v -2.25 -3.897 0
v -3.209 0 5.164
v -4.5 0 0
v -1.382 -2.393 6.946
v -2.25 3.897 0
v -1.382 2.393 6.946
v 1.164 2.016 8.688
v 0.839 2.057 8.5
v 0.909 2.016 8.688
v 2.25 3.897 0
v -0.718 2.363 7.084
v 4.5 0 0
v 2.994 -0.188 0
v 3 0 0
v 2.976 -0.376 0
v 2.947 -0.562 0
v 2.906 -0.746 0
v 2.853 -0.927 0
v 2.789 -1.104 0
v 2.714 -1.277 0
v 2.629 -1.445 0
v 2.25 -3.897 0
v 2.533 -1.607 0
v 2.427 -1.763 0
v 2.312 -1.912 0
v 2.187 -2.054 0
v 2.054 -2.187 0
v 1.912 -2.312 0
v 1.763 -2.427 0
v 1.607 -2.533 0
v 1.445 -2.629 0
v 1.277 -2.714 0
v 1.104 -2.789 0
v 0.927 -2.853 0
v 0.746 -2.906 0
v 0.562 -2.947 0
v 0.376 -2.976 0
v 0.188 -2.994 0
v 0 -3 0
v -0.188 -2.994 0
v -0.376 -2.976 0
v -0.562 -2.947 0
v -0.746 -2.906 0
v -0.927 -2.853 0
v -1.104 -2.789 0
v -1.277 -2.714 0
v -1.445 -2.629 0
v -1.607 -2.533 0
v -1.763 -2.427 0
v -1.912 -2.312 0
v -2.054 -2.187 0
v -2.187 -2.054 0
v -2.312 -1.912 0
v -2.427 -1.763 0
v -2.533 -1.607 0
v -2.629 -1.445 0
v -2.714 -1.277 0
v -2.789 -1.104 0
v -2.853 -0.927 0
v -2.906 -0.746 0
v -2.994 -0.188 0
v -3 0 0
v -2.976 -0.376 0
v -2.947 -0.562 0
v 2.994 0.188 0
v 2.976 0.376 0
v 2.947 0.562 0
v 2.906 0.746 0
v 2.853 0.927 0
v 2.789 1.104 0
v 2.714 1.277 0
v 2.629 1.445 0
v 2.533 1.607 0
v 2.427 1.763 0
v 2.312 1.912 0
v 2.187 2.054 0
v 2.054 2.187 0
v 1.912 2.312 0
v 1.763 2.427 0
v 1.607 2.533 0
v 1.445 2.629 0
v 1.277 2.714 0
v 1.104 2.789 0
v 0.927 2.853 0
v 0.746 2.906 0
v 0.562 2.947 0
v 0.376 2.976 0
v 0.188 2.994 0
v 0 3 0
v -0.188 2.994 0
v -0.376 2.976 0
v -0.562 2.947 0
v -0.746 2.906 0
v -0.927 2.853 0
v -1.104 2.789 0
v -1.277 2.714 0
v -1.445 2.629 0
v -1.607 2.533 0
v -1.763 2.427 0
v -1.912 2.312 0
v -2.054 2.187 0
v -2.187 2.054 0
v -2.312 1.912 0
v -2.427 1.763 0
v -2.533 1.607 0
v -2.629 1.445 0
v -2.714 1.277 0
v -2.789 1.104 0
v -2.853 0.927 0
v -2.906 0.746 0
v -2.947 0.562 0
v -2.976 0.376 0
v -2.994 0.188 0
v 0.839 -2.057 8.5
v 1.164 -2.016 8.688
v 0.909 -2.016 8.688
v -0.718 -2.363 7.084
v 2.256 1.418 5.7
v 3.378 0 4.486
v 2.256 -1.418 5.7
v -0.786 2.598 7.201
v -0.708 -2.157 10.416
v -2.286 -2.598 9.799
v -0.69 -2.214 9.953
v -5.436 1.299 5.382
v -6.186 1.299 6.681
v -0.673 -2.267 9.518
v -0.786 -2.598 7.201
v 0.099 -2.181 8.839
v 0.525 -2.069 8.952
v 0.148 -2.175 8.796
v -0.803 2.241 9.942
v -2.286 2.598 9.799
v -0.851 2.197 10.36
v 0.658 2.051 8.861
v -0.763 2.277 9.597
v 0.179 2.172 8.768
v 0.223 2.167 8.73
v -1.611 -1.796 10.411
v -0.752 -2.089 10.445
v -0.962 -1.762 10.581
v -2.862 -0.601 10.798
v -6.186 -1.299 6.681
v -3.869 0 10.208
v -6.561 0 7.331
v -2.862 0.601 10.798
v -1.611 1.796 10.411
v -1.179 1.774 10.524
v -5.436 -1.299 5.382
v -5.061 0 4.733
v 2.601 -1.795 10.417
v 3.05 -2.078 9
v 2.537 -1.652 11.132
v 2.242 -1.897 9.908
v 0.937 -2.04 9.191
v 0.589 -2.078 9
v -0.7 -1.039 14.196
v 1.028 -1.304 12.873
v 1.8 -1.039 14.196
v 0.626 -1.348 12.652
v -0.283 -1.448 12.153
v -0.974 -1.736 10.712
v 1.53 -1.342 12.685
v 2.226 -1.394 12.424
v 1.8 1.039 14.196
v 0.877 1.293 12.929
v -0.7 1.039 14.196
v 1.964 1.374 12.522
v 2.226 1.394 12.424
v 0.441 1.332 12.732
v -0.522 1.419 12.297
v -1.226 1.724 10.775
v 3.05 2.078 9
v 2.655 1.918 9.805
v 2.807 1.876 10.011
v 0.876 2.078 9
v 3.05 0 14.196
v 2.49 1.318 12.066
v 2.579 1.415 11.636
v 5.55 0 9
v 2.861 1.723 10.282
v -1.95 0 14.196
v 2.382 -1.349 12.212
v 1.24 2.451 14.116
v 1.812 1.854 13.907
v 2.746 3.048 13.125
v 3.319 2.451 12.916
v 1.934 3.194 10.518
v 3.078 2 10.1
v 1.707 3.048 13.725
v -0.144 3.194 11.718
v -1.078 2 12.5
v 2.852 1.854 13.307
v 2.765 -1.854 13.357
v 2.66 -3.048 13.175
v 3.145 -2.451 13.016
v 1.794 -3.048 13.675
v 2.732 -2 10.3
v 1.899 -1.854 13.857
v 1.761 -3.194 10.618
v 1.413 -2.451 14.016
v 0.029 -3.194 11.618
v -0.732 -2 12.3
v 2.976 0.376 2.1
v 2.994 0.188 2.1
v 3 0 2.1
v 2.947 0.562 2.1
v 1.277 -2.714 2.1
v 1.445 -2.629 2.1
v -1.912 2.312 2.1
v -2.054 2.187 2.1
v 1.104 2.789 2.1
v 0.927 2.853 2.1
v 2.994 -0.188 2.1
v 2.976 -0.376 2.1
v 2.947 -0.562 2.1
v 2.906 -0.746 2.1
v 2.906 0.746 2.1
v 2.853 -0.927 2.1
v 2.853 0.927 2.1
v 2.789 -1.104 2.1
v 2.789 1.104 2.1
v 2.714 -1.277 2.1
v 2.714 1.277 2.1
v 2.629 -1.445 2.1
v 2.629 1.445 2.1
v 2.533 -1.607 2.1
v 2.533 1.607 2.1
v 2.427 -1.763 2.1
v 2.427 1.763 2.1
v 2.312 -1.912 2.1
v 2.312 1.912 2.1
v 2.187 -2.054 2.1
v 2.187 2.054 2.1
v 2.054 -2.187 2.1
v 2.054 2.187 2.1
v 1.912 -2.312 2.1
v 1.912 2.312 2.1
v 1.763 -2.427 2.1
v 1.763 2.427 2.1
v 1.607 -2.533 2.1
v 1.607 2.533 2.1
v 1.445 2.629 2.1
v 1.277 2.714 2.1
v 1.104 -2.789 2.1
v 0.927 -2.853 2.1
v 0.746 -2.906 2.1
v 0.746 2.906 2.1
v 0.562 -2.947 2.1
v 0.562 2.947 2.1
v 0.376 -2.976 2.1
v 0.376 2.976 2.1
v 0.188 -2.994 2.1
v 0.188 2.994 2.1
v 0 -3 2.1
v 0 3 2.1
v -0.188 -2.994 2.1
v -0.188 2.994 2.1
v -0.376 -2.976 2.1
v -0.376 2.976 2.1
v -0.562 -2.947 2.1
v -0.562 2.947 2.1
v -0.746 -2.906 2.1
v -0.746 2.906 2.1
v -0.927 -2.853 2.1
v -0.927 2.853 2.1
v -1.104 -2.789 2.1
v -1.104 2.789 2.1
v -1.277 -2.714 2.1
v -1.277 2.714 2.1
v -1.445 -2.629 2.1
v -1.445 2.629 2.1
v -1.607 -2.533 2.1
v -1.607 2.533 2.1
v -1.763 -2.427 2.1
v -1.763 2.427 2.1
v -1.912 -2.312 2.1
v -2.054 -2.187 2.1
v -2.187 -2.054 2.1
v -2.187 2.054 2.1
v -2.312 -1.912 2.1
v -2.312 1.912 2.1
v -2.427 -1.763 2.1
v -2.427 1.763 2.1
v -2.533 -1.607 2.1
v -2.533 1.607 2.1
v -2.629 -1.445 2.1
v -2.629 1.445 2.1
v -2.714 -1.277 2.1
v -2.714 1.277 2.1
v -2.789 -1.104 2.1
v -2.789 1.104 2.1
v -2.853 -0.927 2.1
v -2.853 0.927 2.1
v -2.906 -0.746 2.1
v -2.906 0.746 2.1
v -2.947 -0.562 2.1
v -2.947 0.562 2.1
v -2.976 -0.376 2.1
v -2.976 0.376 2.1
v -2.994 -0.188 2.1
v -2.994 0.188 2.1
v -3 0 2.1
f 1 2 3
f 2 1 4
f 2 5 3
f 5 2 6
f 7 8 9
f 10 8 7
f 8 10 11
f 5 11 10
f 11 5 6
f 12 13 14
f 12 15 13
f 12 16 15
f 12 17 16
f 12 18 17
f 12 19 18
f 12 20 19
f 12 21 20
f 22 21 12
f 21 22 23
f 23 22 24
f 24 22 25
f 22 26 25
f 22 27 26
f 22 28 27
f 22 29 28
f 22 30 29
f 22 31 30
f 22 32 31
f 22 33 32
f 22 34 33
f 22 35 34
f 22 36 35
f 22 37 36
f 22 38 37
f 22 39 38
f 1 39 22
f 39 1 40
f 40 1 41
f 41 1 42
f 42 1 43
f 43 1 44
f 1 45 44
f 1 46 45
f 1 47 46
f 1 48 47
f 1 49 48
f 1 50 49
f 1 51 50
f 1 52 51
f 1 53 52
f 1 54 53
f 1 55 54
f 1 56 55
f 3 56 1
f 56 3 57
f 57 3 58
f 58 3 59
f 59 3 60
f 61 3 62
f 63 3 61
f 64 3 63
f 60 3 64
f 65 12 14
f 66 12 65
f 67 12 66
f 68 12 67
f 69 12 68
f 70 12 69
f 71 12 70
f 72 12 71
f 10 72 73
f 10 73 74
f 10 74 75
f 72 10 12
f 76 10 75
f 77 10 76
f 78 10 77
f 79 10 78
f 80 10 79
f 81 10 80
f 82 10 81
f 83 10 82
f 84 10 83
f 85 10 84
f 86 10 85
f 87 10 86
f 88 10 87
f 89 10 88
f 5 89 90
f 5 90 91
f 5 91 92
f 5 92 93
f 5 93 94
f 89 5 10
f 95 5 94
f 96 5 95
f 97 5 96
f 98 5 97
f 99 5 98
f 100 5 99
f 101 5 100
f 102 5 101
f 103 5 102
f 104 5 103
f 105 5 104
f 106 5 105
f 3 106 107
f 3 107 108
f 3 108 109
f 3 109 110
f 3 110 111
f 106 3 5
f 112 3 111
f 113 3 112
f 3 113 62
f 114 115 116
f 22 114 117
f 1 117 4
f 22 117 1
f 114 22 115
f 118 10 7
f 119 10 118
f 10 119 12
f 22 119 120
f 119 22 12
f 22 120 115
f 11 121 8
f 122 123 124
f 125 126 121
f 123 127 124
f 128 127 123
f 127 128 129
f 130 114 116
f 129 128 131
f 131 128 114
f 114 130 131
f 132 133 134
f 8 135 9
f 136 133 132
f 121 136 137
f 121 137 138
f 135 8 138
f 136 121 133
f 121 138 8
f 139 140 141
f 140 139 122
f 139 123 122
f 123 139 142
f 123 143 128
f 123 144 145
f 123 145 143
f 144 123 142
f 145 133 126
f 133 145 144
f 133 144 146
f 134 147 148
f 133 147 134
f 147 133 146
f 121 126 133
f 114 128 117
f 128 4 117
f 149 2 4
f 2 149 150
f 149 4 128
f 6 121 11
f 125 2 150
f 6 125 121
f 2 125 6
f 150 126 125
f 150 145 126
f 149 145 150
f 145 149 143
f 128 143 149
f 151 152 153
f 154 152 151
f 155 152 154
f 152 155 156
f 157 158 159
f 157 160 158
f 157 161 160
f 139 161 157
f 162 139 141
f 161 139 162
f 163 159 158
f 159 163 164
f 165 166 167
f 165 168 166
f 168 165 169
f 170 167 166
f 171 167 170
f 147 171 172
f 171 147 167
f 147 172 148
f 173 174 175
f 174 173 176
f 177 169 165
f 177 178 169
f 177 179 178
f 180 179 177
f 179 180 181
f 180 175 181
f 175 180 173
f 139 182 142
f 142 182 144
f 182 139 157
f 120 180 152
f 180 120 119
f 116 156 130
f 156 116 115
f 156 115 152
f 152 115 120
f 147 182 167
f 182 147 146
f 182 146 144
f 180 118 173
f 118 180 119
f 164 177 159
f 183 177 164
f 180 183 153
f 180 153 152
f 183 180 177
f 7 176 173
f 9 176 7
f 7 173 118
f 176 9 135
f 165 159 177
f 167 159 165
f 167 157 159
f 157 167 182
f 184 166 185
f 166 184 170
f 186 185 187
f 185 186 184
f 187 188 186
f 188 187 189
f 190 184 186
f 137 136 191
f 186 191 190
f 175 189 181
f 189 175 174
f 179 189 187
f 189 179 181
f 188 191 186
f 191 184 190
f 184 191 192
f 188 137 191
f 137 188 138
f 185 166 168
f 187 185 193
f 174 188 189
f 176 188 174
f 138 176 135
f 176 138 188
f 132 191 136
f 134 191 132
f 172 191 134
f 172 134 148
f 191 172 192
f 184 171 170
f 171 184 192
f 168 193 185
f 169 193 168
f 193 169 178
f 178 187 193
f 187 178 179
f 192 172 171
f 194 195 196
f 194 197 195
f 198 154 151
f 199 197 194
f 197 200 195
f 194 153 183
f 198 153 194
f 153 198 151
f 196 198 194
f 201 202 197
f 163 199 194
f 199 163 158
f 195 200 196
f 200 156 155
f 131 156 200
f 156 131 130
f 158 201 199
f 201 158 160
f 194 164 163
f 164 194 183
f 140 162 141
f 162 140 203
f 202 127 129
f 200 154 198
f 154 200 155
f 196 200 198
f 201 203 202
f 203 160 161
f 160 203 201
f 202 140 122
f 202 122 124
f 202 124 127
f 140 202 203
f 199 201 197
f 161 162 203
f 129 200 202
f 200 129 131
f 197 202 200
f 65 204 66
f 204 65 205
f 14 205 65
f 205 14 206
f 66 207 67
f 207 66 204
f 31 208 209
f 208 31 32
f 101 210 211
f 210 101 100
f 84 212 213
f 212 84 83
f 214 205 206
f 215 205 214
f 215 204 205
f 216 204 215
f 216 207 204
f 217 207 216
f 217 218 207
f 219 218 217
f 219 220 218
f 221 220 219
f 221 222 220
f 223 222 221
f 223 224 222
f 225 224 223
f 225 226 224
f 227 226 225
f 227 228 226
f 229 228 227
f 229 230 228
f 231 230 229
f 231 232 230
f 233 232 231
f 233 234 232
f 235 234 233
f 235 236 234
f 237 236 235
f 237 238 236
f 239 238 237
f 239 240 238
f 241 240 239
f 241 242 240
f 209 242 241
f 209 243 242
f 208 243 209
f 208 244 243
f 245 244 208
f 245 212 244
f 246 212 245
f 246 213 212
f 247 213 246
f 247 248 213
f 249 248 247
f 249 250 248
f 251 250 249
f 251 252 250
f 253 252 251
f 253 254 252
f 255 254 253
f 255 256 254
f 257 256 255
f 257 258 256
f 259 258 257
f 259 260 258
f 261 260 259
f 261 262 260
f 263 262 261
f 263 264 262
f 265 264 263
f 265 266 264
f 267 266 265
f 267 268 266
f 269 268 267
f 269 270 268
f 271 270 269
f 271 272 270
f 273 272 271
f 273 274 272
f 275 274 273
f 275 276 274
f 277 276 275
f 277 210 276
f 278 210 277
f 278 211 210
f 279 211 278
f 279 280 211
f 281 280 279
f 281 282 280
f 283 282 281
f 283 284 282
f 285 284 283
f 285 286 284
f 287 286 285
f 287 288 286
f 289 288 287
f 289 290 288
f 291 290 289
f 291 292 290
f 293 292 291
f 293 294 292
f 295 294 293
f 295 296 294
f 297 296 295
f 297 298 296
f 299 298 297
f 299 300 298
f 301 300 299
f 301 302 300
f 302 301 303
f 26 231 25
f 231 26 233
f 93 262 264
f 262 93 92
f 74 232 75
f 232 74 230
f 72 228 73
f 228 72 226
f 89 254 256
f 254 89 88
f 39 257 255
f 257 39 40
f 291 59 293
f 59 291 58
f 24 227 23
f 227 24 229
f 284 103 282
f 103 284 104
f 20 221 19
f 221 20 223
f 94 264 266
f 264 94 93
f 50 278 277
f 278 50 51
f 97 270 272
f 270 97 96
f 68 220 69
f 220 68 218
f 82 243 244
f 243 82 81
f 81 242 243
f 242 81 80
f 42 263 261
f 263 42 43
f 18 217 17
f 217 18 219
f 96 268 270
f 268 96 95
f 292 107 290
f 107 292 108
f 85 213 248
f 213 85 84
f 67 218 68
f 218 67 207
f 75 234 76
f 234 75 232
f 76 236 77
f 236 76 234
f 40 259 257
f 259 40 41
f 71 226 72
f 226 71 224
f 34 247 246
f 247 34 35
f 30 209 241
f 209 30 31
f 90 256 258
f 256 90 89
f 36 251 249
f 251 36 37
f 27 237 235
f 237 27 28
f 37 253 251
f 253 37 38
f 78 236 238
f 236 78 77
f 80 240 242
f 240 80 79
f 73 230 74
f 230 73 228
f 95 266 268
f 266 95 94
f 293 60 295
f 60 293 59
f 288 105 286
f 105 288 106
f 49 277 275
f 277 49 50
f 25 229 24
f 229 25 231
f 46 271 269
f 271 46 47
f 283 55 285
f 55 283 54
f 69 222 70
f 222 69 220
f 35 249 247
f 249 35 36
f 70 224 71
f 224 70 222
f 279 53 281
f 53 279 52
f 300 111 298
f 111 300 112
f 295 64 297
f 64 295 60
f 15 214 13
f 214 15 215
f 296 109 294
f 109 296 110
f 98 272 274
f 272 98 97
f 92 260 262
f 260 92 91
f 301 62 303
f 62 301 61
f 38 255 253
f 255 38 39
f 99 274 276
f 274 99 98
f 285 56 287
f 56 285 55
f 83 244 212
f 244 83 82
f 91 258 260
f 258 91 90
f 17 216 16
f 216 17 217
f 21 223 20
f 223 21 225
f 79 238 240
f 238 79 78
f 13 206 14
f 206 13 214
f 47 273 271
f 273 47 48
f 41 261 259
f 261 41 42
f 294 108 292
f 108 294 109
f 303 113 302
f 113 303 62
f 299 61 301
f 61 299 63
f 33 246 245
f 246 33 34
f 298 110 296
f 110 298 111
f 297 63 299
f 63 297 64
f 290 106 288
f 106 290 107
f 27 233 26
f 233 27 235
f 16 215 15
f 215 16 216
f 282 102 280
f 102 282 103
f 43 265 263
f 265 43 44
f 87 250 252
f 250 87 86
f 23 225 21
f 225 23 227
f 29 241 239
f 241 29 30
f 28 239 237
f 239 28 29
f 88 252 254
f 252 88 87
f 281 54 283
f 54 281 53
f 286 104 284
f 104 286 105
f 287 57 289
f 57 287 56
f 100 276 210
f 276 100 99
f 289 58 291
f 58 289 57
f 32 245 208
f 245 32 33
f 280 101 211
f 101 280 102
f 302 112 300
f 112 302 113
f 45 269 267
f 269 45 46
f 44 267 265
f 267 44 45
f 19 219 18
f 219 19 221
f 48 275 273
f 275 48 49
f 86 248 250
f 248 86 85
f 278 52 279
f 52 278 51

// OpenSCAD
/*
Horse Piece Generator
*/

// Parameters
$fn = 6; // Number of faces for low-poly preview

magnet_height = 2.1;      // Magnet height
magnet_radius = 3;        // Magnet radius

body_height = 5.5;        // Body height
body_radius = 4.5;        // Body radius

neck_radius = 2;          // Neck radius
head_radius = 1.6;        // Head radius

transparency = 5;         // Transparency level
color_rgb = [143, 255, 61]; // Color as RGB (0–255)

// Bounding box (optional helper for scale visualization)
module bounds() {
    color("red", 0.3)
        cube([6, 1, 17]); // Max width × depth × height
}

// Main model: Horse piece
module horse() {
    union() {
        color(color_rgb / 255, transparency) {

            // Body (tapered cylinder)
            cylinder(h = 12, r1 = body_radius, r2 = body_radius - 3, center = false, $fn = 6);

            // Snout (long nose projection)
            translate([-5, 0, body_height + 1])
                rotate([0, 60, 0])
                    translate([0, 0, 4])
                        scale([1, 1, 1.9])
                            sphere(r = 3);

            // Center of head (bulge)
            translate([0.55, 0, body_height + 3.5])
                scale([2.5, 1.2, 3])
                    sphere(r = neck_radius);

            // Left ear
            translate([1, 2, body_height + 5.8])
                rotate([-10, 30, 0])
                    scale([1.2, 0.7, 1.5])
                        sphere(r = neck_radius);

            // Right ear
            translate([1, -2, body_height + 5.8])
                rotate([10, 30, 0])
                    scale([1, 0.7, 1.5])
                        sphere(r = neck_radius);
        }
    }
}

// Magnet cavity
module magnet_cavity() {
    offset = 0.5;
    translate([0, 0, -offset]) {
        color("yellow", transparency)
            cylinder(h = magnet_height + offset, r = magnet_radius, center = false, $fn = 100);
    }
}

// Final output (horse with magnet hole)
difference() {
    horse();
    magnet_cavity();
}
